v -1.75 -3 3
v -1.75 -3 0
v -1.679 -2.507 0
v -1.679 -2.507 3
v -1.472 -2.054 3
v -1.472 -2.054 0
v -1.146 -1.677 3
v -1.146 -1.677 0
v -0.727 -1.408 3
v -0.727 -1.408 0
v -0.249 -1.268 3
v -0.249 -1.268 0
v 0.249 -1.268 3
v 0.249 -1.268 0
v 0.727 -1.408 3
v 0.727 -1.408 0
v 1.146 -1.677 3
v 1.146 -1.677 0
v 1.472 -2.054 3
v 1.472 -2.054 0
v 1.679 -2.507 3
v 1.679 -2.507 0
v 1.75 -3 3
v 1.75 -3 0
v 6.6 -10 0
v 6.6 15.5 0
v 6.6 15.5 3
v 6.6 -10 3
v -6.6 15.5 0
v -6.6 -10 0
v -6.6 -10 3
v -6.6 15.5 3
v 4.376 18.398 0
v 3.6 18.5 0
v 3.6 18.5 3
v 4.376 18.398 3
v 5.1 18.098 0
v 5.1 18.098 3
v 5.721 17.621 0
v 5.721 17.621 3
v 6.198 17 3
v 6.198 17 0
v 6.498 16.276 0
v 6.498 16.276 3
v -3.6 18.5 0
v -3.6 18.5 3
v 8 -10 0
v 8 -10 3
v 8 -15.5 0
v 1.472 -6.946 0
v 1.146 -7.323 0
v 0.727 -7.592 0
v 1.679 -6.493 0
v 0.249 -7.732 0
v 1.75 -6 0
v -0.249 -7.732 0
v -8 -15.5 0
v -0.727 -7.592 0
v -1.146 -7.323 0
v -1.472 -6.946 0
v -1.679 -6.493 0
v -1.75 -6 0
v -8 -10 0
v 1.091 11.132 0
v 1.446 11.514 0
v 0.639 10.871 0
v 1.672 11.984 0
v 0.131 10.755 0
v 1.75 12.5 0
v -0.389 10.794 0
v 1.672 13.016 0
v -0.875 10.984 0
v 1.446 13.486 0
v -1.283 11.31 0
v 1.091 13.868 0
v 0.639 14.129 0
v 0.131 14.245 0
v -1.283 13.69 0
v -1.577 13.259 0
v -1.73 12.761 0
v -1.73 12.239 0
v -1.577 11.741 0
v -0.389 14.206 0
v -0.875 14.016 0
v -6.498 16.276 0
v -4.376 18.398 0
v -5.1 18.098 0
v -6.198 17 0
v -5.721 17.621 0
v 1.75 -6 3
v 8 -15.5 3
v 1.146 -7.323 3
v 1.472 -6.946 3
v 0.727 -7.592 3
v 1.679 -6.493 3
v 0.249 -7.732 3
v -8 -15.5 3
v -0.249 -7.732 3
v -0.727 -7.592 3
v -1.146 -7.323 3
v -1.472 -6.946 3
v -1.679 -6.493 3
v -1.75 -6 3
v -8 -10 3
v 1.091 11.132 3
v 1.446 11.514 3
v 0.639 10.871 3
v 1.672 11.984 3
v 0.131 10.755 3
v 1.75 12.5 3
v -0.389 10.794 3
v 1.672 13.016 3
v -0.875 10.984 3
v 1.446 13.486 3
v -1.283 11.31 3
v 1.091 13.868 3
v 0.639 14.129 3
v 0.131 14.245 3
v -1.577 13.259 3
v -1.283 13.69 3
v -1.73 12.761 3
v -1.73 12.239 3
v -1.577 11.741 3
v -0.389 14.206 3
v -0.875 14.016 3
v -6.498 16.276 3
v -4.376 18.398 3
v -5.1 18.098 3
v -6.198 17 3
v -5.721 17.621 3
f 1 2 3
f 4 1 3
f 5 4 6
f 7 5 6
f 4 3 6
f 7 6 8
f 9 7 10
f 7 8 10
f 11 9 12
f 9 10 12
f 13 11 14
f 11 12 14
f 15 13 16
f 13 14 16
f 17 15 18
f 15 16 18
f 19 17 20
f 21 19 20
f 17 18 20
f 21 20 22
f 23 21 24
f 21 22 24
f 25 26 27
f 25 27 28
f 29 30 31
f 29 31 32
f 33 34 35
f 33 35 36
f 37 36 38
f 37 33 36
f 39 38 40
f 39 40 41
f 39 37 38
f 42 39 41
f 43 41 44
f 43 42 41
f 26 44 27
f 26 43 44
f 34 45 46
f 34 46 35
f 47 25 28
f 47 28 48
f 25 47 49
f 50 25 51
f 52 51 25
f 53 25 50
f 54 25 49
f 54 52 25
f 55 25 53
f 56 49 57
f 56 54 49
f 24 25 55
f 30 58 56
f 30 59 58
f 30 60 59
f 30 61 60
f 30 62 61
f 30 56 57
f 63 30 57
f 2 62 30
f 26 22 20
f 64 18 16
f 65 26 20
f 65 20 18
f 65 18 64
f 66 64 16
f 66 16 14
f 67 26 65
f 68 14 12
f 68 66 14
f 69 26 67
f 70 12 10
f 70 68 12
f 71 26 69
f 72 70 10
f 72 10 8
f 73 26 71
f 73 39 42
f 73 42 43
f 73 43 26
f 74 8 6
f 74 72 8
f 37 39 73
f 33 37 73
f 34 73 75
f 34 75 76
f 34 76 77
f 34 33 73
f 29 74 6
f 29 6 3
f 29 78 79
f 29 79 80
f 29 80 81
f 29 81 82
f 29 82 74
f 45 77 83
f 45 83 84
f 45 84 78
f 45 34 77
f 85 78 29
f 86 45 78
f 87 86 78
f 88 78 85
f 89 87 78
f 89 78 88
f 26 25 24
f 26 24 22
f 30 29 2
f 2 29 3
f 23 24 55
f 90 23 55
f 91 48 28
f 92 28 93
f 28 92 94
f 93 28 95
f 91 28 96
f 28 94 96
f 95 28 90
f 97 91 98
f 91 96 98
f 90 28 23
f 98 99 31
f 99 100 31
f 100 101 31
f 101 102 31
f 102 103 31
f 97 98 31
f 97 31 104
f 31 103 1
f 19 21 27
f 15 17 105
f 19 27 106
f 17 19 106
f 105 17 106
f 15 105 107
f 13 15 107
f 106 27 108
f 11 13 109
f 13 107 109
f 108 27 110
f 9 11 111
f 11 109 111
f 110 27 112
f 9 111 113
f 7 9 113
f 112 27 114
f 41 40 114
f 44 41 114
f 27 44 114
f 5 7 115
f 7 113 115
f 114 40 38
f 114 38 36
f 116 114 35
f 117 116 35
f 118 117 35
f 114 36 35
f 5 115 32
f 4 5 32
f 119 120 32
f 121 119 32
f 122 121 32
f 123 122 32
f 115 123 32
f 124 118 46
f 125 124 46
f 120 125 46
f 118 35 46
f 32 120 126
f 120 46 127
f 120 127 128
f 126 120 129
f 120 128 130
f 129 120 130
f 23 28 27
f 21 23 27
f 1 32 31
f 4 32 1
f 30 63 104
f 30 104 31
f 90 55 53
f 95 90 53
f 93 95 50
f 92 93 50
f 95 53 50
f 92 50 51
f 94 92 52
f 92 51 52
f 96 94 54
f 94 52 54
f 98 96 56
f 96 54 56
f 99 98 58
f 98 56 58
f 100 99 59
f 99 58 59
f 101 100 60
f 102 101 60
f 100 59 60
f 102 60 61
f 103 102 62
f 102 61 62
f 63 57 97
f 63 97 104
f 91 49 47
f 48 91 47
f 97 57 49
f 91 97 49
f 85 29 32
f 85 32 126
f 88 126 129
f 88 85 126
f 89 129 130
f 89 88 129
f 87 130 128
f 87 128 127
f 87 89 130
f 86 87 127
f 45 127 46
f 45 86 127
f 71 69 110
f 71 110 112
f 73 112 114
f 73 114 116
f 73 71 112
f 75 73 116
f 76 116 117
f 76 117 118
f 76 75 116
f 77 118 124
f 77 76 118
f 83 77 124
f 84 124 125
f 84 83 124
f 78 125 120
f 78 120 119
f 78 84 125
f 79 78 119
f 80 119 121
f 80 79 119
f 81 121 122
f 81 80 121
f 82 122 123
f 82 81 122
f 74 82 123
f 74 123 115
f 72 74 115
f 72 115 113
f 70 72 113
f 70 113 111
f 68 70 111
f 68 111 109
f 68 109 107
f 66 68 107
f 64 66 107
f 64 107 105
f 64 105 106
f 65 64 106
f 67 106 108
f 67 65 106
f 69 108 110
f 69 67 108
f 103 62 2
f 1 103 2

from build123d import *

# Parameters (mm, degrees)
SKETCH1_R           = 1.75
SKETCH1_W           = 16
SKETCH1_H           = 5.5
BOSS_EXTRUDE1_DEPTH = 3


with BuildPart() as part:
    # Sketch1 → Boss-Extrude1 (new body)
    with BuildSketch(Plane.XY):
        with BuildLine():
            Line((-3.6, 18.5), (3.6, 18.5))
            ThreePointArc((3.6, 18.5), (5.721320344, 17.621320344), (6.6, 15.5))
            Line((6.6, 15.5), (6.6, -15.5))
            Line((6.6, -15.5), (-6.6, -15.5))
            Line((-6.6, -15.5), (-6.6, 15.5))
            ThreePointArc((-6.6, 15.5), (-5.721320344, 17.621320344), (-3.6, 18.5))
        make_face()
        with Locations((0, 12.5)):
            Circle(SKETCH1_R, mode=Mode.SUBTRACT)
        with BuildLine():
            Line((1.75, -3), (1.75, -6))
            ThreePointArc((1.75, -6), (0, -7.75), (-1.75, -6))
            Line((-1.75, -6), (-1.75, -3))
            ThreePointArc((-1.75, -3), (0, -1.25), (1.75, -3))
        make_face(mode=Mode.SUBTRACT)
        with Locations((0, -12.75)):
            Rectangle(SKETCH1_W, SKETCH1_H)
    extrude(amount=BOSS_EXTRUDE1_DEPTH)


solid = part.part
